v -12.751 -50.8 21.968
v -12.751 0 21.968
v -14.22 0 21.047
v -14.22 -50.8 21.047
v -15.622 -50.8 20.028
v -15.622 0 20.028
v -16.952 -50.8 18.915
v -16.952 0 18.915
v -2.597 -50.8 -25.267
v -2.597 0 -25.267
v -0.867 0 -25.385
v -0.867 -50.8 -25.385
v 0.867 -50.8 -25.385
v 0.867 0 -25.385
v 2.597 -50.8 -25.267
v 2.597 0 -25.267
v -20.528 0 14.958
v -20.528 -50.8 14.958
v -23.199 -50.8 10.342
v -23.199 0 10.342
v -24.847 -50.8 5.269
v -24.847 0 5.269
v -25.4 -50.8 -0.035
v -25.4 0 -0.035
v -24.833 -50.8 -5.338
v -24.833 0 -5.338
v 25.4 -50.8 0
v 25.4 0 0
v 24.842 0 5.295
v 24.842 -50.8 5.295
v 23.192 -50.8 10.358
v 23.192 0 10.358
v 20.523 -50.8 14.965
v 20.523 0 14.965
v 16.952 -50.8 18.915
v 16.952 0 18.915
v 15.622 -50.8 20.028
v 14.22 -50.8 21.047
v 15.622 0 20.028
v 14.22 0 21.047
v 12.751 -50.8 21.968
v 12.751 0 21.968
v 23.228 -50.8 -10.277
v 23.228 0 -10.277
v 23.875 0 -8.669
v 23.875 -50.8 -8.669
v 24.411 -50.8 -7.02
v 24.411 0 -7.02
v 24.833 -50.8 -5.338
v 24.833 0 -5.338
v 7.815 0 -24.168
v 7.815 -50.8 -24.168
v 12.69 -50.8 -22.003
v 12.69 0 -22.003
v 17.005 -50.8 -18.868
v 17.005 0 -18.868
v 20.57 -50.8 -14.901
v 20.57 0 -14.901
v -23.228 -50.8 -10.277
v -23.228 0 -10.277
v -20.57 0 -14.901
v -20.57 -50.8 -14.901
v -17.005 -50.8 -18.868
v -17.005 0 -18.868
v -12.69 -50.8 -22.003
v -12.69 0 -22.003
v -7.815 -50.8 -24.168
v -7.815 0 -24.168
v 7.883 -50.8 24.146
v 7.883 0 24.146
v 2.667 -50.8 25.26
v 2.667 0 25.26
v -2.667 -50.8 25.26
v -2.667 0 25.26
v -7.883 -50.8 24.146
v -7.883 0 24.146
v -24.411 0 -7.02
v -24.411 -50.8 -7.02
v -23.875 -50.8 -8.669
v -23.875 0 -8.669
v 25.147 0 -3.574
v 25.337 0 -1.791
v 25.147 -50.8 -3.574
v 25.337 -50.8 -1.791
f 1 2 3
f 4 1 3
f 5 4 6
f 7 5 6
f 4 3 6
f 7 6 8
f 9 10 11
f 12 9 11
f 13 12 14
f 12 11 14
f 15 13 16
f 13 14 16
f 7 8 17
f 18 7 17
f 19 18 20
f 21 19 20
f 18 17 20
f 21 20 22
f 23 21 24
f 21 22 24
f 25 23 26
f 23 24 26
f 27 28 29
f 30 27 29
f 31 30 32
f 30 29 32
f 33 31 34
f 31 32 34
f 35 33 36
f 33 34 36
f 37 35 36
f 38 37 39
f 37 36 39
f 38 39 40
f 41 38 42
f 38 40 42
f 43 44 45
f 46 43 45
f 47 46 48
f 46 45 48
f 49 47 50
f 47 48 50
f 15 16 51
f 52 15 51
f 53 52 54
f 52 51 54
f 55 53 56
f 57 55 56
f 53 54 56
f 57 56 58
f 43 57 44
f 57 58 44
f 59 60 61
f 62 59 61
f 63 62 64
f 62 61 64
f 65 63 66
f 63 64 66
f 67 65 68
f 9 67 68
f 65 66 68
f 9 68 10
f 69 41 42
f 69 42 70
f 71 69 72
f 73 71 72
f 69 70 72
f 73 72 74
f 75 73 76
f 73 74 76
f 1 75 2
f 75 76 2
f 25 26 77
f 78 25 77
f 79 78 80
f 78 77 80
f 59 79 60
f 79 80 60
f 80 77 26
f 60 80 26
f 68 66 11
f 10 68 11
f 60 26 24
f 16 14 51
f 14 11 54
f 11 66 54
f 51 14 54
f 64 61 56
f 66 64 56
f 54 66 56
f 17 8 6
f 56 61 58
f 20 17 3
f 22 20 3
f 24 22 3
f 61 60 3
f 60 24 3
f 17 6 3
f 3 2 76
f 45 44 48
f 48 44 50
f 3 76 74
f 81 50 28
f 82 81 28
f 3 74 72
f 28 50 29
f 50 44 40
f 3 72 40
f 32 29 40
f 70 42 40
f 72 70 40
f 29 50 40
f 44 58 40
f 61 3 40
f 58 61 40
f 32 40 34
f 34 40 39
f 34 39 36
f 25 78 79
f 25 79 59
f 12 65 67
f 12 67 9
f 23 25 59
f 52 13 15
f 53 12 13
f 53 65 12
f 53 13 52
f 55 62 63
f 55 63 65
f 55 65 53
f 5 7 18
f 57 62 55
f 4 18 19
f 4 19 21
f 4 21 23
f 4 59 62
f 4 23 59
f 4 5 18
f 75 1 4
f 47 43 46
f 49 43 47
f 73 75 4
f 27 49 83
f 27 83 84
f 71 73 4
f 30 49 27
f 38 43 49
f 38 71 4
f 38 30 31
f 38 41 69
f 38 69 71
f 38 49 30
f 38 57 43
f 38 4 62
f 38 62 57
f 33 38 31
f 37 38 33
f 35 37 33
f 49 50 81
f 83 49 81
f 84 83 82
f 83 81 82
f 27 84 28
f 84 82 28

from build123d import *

# Parameters (mm, degrees)
F1_DEPTH = 50.8


with BuildPart() as f1:
    # F0 (on Front) → F1 (new body)
    with BuildSketch(Plane.XZ):
        with BuildLine():
            ThreePointArc((24.8326570204, -5.338459076), (25.2577660168, -2.6842607624), (25.4, 0))
            ThreePointArc((25.4, 0), (23.1920807644, 10.3579626287), (16.9521740302, 18.9151736881))
            ThreePointArc((16.9521740302, 18.9151736881), (14.9297454082, 20.5490316571), (12.750889326, 21.9675856979))
            ThreePointArc((12.750889326, 21.9675856979), (0, 25.4), (-12.750889326, 21.9675856979))
            ThreePointArc((-12.750889326, 21.9675856979), (-14.9297454082, 20.5490316571), (-16.9521740302, 18.9151736881))
            ThreePointArc((-16.9521740302, 18.9151736881), (-24.1568355139, 7.8490316571), (-24.8326570204, -5.338459076))
            ThreePointArc((-24.8326570204, -5.338459076), (-24.1568355139, -7.8490316571), (-23.2279090598, -10.2773654556))
            ThreePointArc((-23.2279090598, -10.2773654556), (-14.9297454082, -20.5490316571), (-2.5965367436, -25.2669348545))
            ThreePointArc((-2.5965367436, -25.2669348545), (0, -25.4), (2.5965367436, -25.2669348545))
            ThreePointArc((2.5965367436, -25.2669348545), (14.9297454082, -20.5490316571), (23.2279090598, -10.2773654556))
            ThreePointArc((23.2279090598, -10.2773654556), (24.1568355139, -7.8490316571), (24.8326570204, -5.338459076))
        make_face()
    extrude(amount=F1_DEPTH)


solid = f1.part
